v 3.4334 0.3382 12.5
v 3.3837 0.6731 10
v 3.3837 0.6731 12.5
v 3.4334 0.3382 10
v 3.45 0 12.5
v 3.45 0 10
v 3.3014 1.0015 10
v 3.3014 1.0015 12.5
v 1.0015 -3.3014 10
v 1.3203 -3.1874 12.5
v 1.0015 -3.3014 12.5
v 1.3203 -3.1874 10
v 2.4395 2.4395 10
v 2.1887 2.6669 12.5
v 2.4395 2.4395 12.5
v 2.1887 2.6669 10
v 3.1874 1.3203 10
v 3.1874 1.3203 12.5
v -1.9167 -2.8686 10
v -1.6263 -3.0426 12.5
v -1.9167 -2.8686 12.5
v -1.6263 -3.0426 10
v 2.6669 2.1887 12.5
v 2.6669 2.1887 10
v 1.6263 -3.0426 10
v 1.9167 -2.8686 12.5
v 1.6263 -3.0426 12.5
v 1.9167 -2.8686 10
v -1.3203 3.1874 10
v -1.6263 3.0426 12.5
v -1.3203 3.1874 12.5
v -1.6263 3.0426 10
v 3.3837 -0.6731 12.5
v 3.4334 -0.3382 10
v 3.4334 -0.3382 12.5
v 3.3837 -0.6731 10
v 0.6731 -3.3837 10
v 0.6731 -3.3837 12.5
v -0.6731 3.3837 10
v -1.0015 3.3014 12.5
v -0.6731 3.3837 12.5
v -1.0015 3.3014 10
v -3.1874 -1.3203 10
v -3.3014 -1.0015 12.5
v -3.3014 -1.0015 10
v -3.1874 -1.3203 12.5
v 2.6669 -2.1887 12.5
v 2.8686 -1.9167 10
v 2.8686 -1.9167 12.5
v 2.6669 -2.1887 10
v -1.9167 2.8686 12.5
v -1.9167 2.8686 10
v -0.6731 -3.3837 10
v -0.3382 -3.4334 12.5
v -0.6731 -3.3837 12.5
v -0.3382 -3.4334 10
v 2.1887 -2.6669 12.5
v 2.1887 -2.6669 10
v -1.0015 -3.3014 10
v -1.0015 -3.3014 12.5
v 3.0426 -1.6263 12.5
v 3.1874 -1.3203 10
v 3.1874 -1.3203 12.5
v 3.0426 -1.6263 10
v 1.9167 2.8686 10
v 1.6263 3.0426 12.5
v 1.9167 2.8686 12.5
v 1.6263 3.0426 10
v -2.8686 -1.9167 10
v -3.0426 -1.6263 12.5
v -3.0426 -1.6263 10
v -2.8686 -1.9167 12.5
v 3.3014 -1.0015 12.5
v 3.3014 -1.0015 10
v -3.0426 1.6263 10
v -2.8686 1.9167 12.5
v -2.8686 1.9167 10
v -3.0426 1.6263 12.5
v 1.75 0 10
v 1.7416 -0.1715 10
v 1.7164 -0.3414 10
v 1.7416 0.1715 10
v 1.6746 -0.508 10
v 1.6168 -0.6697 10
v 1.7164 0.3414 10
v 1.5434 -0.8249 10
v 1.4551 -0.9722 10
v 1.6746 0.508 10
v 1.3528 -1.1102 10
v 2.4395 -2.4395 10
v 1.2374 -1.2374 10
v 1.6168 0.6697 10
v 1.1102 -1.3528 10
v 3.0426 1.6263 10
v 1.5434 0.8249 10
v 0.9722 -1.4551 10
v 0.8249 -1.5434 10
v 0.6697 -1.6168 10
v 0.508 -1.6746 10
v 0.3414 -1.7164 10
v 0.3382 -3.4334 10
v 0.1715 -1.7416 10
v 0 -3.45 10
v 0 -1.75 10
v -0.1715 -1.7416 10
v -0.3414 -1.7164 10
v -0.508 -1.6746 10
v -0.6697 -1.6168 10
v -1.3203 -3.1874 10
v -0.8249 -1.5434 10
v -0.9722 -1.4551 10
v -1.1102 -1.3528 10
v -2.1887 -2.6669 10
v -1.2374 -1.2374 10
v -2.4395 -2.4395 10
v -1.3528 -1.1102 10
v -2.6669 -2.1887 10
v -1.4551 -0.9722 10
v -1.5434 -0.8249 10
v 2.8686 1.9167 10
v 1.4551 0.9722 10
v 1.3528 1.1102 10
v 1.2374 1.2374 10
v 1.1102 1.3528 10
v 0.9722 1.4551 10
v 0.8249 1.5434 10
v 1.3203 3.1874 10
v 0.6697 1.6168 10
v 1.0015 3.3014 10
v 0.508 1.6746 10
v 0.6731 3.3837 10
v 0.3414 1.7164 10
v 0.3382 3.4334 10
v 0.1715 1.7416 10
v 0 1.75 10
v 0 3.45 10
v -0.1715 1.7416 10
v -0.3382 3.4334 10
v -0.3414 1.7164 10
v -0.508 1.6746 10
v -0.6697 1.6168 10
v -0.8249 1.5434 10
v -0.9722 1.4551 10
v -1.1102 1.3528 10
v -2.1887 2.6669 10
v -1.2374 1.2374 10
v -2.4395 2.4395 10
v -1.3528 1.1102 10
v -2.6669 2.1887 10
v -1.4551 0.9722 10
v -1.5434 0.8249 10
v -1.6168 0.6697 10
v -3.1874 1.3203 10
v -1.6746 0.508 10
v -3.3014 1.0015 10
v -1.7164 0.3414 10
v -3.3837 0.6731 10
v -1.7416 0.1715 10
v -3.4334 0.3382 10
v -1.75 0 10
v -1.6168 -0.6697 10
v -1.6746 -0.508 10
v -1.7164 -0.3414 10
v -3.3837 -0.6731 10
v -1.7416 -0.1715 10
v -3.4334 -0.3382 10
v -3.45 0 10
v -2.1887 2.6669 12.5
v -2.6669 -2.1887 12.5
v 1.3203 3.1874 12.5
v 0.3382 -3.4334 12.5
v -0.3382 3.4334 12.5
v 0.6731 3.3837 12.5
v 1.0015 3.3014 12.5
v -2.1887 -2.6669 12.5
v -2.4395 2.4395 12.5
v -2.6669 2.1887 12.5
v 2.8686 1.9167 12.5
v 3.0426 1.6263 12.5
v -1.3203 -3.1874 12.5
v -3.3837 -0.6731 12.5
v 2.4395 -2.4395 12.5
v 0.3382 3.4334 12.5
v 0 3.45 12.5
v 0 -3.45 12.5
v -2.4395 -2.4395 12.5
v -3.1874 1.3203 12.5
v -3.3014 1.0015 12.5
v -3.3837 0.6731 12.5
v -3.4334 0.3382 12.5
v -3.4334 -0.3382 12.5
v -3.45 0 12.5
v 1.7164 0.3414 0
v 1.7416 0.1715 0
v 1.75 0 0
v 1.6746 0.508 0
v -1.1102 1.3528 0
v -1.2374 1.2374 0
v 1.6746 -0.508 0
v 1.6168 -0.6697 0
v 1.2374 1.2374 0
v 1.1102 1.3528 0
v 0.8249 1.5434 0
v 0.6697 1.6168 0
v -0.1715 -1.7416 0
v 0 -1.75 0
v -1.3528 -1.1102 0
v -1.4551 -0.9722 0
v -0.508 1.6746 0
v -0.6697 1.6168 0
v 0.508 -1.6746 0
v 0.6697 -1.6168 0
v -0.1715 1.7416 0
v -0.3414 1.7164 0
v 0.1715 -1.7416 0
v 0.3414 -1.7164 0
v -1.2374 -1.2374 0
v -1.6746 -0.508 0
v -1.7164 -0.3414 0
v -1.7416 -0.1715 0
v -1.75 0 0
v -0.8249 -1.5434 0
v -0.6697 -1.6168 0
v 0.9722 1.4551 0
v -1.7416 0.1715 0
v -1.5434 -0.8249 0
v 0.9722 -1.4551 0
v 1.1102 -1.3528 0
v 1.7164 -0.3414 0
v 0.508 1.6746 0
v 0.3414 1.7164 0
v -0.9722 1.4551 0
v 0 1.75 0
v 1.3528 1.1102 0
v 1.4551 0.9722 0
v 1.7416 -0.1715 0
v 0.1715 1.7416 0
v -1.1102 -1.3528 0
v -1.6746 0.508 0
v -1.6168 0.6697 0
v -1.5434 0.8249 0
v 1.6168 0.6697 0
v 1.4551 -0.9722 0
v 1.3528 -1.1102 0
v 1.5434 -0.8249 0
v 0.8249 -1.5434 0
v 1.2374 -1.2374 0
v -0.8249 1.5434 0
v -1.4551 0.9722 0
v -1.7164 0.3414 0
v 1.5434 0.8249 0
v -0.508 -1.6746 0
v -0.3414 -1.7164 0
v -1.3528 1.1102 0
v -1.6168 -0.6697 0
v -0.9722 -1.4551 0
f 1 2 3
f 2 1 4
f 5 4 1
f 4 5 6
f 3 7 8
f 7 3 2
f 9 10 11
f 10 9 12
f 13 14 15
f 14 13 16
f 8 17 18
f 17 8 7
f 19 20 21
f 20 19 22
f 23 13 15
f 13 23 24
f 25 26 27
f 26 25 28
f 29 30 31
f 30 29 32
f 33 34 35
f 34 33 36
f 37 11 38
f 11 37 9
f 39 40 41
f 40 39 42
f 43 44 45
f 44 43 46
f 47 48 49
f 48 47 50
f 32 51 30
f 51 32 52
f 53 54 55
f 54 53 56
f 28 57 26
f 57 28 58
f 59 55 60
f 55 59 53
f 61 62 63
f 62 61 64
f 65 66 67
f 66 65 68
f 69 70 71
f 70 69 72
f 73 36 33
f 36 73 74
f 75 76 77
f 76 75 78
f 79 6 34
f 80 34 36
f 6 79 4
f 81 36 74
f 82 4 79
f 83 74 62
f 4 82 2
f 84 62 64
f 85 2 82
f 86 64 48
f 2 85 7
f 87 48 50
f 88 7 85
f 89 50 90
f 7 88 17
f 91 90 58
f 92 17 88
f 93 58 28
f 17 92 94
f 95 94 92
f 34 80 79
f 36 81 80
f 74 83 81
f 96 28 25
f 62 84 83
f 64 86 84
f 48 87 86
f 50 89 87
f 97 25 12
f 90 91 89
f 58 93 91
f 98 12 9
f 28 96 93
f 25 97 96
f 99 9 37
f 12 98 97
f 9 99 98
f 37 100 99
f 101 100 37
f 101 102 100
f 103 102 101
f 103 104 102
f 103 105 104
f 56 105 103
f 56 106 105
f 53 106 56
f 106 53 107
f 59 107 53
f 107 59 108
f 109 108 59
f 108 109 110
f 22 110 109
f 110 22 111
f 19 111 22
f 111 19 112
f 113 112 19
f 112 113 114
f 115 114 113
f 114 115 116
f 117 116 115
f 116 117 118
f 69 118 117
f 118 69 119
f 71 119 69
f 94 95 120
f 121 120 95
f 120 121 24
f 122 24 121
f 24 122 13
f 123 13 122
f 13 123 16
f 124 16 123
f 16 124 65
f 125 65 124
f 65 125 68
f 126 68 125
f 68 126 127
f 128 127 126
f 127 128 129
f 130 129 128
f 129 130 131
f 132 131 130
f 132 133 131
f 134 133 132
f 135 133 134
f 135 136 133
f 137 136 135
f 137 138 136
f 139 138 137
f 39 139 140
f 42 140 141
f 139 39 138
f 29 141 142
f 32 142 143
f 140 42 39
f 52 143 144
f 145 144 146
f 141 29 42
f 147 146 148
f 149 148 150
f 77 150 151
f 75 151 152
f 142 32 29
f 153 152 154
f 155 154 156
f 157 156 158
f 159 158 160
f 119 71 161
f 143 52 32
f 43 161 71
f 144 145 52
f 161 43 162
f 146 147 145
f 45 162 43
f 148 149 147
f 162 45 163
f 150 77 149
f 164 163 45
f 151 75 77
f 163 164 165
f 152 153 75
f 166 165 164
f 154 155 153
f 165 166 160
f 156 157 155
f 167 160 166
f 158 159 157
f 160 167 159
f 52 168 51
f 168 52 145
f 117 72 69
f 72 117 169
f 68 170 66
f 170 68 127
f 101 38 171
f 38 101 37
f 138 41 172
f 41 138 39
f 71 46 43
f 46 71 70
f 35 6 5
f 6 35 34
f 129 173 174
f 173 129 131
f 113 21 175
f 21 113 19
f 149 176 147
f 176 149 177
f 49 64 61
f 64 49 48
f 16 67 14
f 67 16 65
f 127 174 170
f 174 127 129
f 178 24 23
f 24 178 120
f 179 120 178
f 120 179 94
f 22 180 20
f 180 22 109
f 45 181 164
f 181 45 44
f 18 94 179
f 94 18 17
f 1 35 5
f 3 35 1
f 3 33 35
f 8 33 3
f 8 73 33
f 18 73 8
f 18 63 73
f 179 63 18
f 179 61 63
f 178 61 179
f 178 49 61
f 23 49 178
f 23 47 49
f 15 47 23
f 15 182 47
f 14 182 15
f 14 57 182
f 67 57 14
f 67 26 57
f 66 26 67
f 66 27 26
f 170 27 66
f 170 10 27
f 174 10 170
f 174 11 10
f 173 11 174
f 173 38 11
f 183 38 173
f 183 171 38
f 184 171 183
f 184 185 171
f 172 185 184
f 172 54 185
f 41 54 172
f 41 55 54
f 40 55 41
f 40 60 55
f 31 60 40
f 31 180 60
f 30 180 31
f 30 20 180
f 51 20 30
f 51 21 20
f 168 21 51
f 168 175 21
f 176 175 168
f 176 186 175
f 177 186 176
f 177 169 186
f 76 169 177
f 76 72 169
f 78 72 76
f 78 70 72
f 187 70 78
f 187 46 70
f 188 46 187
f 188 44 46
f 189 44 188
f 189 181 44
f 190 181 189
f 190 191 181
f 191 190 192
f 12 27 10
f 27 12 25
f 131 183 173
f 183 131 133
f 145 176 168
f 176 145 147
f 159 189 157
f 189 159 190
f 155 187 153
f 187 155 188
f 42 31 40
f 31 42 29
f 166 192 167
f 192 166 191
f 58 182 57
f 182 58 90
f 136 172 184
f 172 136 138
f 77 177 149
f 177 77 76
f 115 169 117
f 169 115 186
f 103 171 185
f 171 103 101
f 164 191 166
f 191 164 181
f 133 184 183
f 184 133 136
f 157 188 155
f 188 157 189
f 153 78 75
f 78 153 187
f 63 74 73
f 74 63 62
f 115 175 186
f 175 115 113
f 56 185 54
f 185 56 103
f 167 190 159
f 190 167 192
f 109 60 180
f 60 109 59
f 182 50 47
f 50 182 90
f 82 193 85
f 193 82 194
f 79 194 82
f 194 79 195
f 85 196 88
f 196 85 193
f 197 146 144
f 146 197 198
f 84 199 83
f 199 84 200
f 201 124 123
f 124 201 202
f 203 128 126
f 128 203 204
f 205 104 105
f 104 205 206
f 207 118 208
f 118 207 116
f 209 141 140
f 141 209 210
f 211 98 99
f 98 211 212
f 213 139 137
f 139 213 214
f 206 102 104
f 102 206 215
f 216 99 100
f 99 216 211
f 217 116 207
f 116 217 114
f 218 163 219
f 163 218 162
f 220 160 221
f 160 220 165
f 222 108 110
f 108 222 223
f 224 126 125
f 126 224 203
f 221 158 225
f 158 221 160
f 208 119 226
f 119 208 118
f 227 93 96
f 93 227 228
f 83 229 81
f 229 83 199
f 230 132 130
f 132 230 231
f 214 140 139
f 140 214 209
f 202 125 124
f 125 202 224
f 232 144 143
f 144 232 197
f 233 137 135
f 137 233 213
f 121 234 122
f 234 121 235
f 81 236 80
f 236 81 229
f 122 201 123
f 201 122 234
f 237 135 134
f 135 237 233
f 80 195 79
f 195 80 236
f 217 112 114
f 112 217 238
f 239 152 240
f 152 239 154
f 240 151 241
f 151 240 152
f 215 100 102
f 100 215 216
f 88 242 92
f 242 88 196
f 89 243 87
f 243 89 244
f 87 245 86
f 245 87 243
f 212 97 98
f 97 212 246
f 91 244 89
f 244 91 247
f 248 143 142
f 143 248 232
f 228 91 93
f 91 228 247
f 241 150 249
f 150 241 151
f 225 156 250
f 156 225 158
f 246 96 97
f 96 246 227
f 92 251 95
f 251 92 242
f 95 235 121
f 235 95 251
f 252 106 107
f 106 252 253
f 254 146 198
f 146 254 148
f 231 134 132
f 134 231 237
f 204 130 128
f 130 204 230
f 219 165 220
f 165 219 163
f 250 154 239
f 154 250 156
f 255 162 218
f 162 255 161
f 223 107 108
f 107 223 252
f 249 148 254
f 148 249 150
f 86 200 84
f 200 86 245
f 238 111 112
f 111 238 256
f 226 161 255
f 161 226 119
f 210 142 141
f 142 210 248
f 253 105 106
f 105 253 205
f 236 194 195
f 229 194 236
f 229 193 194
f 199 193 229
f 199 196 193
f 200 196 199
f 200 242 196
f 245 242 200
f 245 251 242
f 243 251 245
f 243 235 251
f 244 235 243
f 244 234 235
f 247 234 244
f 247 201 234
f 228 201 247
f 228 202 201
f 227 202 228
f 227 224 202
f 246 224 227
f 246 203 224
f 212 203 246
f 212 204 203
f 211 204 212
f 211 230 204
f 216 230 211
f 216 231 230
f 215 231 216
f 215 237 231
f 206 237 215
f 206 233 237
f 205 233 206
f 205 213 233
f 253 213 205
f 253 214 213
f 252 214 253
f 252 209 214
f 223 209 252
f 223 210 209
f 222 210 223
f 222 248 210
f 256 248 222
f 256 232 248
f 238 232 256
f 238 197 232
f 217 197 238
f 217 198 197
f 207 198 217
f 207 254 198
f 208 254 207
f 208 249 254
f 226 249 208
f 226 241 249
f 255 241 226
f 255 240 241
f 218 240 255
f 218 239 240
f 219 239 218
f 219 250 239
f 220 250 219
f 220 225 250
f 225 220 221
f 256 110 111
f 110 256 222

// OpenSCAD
module pan_head_screw() {
    union() {
        // Screw head
        translate([0, 0, 10])
            cylinder(h = 2.5, d = 6.9, $fn = 64);
        
        // Screw shaft
        cylinder(h = 10, d = 3.5, $fn = 64);
    }
}

pan_head_screw();
